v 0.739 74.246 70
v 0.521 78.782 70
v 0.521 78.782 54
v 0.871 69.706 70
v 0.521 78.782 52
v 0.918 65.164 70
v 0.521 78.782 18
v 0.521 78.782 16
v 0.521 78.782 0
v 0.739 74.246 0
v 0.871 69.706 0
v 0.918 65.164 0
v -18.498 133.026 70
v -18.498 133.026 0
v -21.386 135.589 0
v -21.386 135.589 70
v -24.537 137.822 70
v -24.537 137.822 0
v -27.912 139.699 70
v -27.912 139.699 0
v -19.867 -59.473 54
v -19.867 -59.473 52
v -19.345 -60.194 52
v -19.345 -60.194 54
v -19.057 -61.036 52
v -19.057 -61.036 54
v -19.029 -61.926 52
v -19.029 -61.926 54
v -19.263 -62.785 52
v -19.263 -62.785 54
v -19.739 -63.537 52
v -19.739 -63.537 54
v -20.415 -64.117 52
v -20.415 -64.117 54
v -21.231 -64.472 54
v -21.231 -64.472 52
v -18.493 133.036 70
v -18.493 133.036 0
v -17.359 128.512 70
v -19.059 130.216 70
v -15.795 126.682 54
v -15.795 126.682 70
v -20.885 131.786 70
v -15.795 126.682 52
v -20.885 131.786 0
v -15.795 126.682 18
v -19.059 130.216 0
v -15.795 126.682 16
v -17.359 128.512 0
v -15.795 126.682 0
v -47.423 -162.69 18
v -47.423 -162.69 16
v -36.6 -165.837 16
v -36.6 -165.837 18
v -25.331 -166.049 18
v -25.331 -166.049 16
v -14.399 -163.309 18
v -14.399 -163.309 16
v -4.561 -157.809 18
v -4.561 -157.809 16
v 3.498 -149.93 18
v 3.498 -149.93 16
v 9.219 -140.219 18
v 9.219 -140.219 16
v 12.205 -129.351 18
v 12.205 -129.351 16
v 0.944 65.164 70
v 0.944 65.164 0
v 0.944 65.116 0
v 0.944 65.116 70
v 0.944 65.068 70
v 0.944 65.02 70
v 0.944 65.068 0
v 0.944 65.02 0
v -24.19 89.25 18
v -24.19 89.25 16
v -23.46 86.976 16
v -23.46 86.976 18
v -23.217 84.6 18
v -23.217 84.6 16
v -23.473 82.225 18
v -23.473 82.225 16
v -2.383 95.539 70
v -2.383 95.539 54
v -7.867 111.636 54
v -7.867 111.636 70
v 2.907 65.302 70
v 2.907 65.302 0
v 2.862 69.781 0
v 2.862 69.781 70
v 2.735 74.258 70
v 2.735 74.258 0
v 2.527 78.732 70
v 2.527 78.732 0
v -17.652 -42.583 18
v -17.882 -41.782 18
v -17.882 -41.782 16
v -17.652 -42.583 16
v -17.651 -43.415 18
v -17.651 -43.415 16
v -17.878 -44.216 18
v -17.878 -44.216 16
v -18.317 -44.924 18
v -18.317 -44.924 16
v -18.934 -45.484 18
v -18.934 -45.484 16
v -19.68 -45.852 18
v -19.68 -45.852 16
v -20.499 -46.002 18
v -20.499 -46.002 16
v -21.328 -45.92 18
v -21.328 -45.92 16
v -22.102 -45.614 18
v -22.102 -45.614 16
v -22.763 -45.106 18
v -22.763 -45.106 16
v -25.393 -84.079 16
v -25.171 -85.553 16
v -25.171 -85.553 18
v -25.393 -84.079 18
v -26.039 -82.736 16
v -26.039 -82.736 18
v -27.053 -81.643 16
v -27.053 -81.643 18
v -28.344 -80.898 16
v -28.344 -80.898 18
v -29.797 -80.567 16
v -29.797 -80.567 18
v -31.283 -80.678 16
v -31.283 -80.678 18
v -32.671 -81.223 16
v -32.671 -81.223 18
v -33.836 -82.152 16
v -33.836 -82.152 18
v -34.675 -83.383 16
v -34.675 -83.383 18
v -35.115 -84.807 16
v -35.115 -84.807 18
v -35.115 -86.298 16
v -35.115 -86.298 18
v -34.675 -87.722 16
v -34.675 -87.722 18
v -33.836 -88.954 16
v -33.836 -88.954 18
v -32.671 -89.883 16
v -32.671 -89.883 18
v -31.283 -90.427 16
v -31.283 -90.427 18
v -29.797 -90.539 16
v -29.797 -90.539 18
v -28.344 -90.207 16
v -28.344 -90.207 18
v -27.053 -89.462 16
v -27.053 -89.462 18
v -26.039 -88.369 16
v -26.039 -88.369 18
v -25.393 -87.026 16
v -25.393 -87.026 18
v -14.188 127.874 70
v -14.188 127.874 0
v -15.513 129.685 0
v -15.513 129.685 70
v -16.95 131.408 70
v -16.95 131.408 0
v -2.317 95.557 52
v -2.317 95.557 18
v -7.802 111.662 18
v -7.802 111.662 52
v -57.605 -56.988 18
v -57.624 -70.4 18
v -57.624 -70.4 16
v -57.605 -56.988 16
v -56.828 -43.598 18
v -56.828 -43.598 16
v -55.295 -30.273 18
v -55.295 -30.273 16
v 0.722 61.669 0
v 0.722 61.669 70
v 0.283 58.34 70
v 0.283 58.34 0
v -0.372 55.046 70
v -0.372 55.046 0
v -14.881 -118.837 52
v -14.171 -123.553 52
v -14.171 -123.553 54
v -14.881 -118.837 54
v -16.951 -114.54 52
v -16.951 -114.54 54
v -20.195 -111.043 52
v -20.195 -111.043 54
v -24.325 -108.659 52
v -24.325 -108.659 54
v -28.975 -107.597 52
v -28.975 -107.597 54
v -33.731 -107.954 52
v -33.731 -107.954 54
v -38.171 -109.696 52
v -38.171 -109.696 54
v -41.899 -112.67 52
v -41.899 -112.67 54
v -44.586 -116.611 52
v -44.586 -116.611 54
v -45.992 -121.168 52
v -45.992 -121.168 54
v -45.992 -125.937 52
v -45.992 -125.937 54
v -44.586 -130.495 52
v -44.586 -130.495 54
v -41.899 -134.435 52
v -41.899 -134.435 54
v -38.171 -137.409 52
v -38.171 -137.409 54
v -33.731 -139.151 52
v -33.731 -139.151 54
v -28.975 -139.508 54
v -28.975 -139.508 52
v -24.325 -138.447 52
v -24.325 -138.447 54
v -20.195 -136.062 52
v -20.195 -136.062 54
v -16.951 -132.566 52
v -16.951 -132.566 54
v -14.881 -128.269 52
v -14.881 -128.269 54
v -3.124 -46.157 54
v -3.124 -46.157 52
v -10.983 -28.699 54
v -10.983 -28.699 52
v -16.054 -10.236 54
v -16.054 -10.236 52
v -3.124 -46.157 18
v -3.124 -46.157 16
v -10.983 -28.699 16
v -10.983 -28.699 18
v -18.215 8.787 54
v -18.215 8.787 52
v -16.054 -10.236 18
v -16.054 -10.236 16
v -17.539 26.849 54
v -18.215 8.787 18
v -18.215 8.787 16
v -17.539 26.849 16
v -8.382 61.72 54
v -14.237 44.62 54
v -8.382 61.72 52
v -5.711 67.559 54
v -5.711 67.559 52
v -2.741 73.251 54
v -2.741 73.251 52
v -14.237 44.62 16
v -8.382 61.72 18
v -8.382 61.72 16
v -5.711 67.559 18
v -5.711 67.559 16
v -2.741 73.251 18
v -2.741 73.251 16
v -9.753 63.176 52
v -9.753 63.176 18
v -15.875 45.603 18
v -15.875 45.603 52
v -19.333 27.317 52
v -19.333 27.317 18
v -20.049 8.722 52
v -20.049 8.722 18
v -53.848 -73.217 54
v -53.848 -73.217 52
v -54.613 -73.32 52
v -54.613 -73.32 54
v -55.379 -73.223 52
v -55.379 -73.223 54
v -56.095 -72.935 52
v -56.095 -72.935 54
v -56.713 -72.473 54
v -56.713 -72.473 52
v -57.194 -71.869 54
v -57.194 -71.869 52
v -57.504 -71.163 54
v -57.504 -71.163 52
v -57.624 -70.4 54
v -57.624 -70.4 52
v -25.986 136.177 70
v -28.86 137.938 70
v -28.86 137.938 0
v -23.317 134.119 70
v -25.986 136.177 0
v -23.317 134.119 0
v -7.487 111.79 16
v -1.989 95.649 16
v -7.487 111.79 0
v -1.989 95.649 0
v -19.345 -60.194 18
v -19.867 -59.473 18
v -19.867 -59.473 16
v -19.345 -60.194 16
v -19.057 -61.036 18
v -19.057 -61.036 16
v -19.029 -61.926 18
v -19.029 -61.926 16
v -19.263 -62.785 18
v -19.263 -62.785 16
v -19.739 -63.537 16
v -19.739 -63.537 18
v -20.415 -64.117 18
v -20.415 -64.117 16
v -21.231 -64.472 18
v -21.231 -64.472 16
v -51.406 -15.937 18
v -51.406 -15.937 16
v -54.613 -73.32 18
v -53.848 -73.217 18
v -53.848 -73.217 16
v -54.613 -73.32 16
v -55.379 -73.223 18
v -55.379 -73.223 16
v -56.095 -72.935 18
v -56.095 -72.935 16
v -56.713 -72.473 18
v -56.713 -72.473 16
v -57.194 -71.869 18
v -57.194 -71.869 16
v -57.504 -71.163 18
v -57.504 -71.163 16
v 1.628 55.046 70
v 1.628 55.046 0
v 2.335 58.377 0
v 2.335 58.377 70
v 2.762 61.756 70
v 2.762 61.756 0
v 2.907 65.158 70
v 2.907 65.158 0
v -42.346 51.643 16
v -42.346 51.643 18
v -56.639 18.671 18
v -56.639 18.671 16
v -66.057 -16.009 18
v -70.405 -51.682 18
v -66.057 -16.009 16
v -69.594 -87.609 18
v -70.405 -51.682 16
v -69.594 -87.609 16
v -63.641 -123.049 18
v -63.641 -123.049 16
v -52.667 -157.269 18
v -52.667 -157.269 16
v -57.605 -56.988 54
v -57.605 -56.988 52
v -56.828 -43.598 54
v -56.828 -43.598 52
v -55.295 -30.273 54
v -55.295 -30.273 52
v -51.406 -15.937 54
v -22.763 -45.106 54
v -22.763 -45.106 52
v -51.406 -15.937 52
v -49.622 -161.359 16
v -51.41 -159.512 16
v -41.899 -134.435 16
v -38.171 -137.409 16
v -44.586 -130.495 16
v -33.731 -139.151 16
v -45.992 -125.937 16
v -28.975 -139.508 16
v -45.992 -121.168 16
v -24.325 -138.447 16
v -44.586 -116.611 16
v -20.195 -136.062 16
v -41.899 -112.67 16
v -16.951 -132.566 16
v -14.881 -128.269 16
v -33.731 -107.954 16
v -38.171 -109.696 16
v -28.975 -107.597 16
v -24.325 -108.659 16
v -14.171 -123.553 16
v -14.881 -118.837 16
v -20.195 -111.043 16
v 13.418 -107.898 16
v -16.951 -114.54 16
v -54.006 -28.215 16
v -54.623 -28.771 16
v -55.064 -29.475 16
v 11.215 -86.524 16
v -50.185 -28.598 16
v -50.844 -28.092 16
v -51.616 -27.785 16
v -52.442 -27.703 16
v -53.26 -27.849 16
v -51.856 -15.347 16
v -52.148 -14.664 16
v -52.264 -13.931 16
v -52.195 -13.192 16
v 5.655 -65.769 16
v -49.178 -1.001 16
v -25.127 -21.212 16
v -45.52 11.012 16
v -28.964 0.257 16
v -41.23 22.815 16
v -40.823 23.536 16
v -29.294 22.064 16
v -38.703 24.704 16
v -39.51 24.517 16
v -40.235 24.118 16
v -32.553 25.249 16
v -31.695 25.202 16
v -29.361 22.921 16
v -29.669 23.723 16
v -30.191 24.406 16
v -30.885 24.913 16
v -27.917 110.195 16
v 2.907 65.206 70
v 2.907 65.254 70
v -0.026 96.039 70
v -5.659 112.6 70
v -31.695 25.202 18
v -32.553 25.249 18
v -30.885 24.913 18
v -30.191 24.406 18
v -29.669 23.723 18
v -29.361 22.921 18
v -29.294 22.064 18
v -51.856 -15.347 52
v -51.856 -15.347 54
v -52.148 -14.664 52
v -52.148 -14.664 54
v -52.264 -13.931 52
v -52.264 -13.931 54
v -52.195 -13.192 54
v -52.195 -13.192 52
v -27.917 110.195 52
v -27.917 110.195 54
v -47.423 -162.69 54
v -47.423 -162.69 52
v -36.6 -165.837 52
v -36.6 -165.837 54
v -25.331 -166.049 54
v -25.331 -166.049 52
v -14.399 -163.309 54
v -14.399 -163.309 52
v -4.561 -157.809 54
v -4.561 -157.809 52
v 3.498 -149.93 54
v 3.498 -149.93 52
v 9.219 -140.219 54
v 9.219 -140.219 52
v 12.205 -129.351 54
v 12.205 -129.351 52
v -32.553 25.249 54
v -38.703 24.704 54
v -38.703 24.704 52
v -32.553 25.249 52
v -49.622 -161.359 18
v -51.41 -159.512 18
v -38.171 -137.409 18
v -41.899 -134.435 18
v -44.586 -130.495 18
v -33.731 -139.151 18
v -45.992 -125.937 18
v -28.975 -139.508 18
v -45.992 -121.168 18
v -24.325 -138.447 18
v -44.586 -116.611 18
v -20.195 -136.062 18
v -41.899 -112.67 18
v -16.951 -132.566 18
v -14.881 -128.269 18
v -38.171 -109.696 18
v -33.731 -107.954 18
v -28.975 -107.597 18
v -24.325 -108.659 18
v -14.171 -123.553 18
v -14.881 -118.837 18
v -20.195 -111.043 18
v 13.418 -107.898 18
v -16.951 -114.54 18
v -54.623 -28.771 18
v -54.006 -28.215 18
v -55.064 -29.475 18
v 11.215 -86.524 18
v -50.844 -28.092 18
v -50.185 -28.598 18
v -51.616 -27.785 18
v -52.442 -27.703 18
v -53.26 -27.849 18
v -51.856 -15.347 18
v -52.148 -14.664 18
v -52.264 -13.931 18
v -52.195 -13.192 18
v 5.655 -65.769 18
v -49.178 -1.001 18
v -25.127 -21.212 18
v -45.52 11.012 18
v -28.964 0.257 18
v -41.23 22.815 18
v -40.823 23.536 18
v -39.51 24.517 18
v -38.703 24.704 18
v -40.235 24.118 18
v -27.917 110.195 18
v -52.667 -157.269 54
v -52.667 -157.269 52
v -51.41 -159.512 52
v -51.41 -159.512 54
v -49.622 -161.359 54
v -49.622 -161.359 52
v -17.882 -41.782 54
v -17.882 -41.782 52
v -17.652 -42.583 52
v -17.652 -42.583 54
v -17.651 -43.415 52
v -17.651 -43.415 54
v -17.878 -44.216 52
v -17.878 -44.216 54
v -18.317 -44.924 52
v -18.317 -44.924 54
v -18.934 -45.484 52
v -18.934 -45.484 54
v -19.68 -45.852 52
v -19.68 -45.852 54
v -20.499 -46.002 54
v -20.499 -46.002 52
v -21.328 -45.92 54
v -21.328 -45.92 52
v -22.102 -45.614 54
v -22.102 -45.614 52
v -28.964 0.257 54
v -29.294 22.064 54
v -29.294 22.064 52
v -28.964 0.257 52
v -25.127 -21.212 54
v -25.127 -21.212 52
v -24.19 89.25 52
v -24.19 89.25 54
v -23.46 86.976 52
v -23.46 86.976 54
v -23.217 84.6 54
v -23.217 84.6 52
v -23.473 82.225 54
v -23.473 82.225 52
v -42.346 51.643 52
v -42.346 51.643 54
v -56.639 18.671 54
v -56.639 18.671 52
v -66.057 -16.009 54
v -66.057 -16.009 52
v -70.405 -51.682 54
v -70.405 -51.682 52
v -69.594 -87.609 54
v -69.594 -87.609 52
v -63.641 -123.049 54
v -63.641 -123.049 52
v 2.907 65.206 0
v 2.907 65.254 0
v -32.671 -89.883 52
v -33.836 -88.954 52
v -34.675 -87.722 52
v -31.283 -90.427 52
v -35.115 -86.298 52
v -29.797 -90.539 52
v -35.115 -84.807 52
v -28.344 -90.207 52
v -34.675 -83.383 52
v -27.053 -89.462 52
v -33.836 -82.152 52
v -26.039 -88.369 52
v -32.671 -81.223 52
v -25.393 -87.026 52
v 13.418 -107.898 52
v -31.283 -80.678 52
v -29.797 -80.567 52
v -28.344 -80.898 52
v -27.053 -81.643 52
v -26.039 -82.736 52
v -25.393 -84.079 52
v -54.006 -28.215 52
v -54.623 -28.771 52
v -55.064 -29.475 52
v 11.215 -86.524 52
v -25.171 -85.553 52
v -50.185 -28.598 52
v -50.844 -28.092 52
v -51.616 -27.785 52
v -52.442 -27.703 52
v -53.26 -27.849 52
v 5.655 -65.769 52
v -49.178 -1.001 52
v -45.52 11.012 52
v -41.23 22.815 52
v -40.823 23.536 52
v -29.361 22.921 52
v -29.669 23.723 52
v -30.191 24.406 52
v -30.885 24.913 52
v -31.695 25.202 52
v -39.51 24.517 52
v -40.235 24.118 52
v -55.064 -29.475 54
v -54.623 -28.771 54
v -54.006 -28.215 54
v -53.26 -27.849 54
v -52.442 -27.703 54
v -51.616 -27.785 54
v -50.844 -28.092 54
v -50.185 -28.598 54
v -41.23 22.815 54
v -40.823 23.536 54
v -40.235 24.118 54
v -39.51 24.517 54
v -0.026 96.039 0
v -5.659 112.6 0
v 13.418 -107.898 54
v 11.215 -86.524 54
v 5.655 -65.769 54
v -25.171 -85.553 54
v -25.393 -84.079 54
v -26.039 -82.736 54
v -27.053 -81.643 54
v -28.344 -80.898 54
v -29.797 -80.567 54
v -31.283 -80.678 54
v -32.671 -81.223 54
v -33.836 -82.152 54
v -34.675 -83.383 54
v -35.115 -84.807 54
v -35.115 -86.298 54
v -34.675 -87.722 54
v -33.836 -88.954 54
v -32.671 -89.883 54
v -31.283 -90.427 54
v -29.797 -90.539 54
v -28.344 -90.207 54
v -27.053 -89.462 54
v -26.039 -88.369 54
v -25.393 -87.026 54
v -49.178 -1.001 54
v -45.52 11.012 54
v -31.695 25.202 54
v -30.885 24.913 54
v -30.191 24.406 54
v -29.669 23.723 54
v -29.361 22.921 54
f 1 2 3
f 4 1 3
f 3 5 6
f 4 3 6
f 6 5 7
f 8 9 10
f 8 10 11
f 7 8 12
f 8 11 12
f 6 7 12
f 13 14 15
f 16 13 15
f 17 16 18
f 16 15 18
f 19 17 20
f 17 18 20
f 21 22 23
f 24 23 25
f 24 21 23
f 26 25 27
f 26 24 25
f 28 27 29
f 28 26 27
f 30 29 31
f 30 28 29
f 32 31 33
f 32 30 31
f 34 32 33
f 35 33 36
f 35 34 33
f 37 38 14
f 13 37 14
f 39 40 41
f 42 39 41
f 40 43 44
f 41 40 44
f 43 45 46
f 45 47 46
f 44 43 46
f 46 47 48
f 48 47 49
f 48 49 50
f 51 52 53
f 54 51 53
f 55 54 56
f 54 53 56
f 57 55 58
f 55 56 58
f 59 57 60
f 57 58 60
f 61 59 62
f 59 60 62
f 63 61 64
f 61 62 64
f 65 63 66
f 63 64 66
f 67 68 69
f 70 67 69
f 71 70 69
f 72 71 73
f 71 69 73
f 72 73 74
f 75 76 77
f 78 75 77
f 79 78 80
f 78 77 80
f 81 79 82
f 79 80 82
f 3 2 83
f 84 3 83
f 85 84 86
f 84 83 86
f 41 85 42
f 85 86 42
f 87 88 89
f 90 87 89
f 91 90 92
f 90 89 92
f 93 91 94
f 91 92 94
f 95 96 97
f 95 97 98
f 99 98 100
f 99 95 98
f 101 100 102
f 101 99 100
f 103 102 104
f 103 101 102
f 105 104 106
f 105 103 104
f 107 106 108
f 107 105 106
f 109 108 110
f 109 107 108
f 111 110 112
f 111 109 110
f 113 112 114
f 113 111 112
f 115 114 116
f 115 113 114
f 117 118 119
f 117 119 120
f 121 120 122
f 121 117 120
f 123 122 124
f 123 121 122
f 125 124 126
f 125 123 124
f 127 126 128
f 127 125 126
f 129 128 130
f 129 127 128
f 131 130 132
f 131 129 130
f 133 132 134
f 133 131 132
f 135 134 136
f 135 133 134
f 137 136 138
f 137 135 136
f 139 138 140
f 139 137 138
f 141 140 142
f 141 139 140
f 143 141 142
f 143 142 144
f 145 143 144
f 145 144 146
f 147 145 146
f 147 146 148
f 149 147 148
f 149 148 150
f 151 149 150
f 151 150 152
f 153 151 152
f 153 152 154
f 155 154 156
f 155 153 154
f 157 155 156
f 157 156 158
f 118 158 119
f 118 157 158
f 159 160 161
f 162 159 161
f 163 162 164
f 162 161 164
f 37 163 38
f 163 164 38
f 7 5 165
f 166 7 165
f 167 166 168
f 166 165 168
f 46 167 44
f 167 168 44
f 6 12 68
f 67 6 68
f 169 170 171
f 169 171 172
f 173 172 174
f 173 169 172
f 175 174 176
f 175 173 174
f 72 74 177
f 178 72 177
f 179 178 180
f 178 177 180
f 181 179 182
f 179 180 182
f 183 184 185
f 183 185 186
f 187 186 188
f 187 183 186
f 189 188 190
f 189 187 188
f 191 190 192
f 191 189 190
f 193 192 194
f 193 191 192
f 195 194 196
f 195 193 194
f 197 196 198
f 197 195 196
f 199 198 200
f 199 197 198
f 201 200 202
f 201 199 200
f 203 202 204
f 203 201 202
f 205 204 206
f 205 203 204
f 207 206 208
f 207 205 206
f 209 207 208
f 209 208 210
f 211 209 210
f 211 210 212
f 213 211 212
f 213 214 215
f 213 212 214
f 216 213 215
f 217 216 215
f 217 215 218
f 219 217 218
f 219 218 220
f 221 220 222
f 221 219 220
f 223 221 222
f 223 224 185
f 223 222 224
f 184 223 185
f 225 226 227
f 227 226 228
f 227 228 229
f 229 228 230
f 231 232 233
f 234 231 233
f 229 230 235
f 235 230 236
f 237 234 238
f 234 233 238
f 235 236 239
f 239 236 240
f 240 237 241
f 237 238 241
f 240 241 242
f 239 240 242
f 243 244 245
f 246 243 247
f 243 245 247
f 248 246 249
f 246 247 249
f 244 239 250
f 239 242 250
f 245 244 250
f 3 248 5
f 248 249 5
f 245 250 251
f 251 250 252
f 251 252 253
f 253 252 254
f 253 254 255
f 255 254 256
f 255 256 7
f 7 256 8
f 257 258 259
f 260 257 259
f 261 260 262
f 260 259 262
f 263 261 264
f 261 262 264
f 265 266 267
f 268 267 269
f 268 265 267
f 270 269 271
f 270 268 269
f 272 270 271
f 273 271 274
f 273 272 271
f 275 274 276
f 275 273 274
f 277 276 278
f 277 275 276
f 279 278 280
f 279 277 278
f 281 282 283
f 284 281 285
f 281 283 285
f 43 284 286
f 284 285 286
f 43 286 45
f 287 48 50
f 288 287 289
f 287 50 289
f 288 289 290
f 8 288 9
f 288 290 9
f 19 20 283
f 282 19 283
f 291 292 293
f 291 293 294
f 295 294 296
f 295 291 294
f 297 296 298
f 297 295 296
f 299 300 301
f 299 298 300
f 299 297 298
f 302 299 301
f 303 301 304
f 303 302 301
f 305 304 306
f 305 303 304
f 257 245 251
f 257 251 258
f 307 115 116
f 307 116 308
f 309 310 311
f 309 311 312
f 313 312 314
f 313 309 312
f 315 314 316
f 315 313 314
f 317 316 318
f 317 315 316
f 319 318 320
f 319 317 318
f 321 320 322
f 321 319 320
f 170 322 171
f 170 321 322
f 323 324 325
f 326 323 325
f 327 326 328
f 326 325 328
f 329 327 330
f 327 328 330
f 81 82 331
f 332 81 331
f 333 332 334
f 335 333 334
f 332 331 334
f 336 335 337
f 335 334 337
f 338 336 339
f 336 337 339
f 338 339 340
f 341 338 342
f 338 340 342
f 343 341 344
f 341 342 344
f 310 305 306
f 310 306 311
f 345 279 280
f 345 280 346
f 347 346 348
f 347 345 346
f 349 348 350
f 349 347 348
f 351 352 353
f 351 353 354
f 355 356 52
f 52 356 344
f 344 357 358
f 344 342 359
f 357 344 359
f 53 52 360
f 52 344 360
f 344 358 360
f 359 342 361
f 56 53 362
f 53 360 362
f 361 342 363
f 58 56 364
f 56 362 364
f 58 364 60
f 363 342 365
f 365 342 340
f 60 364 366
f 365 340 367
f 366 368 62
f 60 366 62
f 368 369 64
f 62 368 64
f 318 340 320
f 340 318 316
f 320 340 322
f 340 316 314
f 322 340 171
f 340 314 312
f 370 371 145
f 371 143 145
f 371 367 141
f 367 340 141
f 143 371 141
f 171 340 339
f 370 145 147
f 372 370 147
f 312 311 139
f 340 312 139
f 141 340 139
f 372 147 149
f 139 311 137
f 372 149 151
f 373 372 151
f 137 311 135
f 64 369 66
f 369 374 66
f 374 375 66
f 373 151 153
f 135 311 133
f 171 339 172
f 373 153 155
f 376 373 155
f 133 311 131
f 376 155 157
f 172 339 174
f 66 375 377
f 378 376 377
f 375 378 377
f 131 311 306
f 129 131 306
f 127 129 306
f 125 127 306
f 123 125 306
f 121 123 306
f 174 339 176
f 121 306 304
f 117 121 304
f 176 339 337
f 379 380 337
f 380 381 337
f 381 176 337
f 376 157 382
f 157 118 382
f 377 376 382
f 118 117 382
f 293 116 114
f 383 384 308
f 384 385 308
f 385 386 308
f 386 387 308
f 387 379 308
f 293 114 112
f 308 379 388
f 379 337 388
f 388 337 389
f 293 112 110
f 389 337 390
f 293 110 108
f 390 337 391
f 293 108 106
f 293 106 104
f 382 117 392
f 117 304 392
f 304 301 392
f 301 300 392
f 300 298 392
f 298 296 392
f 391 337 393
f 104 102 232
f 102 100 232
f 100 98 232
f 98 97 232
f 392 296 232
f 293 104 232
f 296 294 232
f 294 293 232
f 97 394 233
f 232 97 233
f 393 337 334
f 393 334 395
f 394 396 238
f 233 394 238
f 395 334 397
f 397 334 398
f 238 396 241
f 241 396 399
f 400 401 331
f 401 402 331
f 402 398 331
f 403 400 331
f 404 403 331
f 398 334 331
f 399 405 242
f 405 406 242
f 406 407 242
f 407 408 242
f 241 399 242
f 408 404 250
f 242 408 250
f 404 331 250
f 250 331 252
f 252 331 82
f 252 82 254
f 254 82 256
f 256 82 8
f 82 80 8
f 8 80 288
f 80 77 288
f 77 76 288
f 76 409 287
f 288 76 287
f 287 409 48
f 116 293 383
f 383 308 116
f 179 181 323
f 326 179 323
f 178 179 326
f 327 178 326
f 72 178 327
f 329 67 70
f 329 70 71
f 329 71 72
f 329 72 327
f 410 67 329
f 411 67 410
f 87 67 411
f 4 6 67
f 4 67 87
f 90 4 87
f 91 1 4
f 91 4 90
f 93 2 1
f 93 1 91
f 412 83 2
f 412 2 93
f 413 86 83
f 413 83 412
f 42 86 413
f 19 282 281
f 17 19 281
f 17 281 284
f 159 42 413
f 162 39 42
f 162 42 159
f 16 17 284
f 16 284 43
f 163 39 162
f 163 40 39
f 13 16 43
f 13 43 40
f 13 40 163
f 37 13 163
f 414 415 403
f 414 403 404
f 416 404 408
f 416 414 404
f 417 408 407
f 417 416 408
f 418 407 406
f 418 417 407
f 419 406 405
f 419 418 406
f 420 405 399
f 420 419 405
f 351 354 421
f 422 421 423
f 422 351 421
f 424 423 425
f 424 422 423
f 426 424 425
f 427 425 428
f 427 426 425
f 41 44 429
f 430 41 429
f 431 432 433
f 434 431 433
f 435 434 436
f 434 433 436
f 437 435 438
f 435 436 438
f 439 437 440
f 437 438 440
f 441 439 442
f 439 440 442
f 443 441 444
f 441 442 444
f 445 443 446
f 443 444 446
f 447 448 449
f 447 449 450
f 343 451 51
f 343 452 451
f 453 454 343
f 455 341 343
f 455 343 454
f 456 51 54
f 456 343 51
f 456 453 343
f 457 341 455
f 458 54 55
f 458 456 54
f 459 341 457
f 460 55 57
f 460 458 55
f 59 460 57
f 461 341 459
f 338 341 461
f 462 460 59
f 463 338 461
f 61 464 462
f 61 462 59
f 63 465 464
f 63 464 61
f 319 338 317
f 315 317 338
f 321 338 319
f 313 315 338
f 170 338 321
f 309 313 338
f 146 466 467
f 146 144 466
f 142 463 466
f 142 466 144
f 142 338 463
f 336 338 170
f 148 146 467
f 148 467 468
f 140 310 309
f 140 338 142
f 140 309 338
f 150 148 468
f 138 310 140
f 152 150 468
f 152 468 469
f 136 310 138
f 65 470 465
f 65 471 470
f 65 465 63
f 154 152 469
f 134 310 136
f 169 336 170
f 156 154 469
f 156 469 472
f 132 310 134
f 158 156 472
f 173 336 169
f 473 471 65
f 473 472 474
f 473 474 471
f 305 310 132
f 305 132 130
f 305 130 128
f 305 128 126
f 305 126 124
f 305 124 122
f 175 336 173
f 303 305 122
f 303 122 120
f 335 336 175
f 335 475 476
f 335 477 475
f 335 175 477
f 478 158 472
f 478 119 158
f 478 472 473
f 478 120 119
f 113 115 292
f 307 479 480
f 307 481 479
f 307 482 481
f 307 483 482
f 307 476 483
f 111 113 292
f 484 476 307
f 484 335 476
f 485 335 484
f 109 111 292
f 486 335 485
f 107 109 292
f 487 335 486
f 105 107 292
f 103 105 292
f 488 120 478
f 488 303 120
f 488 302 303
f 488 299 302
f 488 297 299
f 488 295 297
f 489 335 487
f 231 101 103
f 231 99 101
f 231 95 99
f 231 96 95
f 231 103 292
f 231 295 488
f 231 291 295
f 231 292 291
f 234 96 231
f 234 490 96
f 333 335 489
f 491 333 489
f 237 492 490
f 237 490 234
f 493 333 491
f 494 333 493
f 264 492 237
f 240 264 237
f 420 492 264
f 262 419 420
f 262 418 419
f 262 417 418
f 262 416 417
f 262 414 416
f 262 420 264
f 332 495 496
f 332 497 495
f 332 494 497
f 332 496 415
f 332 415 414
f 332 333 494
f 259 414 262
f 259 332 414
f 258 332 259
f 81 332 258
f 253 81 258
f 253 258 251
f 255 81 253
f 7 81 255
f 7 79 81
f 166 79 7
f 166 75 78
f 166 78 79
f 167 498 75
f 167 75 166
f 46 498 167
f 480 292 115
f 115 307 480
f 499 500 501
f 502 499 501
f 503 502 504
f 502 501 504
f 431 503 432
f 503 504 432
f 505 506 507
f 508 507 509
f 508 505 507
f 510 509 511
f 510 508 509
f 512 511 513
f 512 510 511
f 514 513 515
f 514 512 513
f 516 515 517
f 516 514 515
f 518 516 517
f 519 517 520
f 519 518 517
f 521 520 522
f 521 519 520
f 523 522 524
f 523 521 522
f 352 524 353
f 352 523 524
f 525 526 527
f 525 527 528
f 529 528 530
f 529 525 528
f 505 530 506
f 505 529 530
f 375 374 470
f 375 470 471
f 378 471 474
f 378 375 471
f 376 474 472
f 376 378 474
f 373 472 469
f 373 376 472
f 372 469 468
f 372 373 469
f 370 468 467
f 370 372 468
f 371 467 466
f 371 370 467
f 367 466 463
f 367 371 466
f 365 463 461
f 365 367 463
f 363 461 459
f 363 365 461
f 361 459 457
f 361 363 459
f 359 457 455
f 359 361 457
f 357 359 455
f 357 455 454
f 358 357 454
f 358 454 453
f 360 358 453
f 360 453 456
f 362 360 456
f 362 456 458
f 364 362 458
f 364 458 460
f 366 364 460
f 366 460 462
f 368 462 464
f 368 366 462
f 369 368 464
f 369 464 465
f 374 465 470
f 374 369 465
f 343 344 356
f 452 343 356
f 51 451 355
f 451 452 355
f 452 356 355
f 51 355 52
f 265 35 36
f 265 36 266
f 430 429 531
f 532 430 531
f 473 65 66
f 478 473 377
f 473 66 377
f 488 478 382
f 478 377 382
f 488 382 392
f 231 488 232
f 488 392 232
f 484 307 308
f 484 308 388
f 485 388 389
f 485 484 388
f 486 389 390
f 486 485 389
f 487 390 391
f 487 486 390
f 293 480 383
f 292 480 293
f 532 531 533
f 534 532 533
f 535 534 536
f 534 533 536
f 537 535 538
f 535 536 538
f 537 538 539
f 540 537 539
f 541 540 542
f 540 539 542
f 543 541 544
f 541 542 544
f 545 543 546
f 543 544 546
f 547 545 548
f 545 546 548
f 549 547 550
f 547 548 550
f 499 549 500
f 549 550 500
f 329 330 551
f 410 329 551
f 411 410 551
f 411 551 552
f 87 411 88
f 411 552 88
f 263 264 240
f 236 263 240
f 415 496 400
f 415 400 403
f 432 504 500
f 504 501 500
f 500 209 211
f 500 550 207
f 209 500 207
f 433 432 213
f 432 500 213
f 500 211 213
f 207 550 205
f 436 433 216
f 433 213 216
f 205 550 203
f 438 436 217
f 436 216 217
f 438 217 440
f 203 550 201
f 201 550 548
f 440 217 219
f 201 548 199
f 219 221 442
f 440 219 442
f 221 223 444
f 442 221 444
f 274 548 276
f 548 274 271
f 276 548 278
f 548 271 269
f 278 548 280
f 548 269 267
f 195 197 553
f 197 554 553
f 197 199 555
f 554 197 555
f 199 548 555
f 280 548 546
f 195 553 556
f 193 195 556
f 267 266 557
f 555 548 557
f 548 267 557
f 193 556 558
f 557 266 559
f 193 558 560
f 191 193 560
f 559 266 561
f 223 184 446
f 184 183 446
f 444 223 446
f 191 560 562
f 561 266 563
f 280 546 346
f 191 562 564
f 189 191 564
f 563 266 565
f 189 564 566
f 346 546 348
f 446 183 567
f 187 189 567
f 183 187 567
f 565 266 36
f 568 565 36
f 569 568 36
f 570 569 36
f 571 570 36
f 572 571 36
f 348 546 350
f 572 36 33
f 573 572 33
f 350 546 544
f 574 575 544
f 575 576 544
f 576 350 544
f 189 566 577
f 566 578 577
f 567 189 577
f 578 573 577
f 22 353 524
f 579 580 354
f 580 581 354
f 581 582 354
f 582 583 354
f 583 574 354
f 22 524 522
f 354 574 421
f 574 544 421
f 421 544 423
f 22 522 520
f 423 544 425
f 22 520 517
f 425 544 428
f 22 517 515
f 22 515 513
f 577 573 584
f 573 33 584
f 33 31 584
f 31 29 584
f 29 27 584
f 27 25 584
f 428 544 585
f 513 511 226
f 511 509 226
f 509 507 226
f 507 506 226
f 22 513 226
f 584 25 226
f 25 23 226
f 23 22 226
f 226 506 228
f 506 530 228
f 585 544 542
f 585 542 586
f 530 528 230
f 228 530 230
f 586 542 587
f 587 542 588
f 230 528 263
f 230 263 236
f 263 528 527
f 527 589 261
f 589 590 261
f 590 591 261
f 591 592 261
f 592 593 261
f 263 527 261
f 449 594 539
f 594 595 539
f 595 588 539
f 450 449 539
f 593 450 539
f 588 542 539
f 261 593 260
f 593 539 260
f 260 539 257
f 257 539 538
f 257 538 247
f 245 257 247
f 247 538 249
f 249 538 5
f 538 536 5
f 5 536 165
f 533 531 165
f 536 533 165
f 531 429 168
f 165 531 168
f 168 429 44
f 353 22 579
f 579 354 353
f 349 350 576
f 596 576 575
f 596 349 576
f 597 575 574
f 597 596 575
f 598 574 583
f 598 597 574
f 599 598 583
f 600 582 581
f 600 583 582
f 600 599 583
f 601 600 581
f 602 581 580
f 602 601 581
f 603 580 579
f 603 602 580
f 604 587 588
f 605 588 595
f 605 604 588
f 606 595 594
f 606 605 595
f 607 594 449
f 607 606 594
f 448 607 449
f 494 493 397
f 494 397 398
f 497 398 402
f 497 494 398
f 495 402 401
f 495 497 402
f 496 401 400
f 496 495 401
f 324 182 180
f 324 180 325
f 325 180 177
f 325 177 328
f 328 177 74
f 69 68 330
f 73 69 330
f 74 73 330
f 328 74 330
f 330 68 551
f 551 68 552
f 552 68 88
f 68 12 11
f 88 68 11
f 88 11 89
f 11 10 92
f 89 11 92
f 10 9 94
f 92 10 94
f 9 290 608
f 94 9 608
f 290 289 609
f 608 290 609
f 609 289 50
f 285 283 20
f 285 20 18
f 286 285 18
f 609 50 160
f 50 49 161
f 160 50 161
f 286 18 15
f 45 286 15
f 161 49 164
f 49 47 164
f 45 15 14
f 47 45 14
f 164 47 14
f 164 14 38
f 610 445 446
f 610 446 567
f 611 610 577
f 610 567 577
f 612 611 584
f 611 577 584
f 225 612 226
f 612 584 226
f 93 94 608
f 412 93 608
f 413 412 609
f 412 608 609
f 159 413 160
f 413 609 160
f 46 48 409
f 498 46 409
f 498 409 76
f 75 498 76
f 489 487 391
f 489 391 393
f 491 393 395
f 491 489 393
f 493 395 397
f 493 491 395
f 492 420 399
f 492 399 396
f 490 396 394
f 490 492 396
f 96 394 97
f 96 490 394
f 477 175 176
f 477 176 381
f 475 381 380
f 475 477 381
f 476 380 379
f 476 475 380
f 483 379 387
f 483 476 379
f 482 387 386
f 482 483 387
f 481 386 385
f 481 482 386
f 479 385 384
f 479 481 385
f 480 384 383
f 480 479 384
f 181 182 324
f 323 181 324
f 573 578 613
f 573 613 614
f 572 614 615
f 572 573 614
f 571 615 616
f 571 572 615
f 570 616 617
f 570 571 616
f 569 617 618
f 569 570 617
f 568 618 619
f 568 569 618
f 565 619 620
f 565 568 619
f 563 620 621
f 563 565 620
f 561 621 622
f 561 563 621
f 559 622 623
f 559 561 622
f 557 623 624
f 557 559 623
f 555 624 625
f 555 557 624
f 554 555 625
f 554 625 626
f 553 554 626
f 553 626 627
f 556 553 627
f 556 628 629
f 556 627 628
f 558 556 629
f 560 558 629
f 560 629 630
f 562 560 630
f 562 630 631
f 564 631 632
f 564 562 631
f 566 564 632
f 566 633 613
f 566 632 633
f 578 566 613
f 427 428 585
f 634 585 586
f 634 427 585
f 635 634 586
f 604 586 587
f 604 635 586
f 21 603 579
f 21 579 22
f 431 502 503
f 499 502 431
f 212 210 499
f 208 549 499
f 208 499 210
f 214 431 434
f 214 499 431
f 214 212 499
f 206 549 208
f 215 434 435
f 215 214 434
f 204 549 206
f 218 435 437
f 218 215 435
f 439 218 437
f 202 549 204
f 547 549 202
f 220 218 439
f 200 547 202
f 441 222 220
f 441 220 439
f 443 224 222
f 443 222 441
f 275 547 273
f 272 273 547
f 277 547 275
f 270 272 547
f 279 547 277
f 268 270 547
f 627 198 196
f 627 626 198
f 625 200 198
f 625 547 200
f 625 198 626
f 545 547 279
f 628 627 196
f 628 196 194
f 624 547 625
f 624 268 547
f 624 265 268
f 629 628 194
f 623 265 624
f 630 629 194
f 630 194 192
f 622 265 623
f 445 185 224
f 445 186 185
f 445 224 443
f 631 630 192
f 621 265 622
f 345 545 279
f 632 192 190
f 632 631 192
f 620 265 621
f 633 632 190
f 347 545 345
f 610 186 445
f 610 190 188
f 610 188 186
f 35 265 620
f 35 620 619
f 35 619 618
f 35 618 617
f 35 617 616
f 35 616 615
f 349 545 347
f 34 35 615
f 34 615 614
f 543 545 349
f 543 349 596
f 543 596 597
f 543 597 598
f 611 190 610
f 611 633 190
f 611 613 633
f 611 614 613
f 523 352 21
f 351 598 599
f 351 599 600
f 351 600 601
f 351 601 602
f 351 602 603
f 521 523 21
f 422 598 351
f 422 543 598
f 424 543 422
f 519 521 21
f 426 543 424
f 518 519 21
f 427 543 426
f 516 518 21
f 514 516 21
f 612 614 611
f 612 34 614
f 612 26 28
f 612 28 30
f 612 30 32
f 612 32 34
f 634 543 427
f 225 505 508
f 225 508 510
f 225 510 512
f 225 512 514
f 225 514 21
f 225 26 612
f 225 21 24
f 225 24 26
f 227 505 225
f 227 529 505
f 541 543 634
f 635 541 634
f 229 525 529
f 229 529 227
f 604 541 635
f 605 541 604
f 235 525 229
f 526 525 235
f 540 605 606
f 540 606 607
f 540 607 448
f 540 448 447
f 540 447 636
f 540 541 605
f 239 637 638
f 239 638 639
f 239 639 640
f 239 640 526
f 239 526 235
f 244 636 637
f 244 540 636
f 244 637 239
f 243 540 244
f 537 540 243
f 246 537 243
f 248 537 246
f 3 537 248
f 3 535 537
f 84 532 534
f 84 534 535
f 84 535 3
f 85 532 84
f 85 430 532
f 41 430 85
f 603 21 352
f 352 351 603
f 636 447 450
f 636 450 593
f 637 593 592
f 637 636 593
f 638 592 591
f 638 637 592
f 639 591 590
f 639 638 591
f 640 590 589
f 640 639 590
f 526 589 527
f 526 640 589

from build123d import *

# Parameters (mm, degrees)
SKETCH1_R           = 16
SKETCH1_R_2         = 5
BOSS_EXTRUDE3_DEPTH = 70
CUT_EXTRUDE2_DEPTH  = 16
CUT_EXTRUDE3_DEPTH  = 16
SKETCH7_W           = 34
SKETCH7_H           = 251.612307305
CUT_EXTRUDE4_DEPTH  = 87.5
CUT_EXTRUDE5_DEPTH  = 34
BOSS_EXTRUDE4_START = -38
BOSS_EXTRUDE4_DEPTH = 38
CUT_EXTRUDE6_DEPTH  = 135


with BuildPart() as part:
    # Sketch1 → Boss-Extrude3 (new body)
    with BuildSketch(Plane.XY):
        with BuildLine():
            Line((-18.492879119, 133.036316601), (-18.498498023, 133.025878551))
            ThreePointArc((-18.498498023, 133.025878551), (-22.931133945, 136.748933151), (-27.911859958, 139.698808598))
            Line((-27.911859958, 139.698808598), (-28.859852333, 137.937754807))
            ThreePointArc((-28.859852333, 137.937754807), (-24.623995913, 135.183968868), (-20.885371833, 131.785659496))
            ThreePointArc((-20.885371833, 131.785659496), (-18.192980361, 129.380347747), (-15.794912153, 126.681502565))
            Line((-15.794912153, 126.681502565), (-27.917185271, 110.194914382))
            Line((-27.917185271, 110.194914382), (-24.189891295, 89.250297825))
            ThreePointArc((-24.189891295, 89.250297825), (-23.276240724, 85.794240187), (-23.472804176, 82.224862851))
            ThreePointArc((-23.472804176, 82.224862851), (-68.872718383, -33.767386176), (-52.667247609, -157.269356853))
            ThreePointArc((-52.667247609, -157.269356853), (-50.575514204, -160.492975125), (-47.422535875, -162.689743445))
            ThreePointArc((-47.422535875, -162.689743445), (-9.297986917, -160.884668476), (12.205361962, -129.351423863))
            ThreePointArc((12.205361962, -129.351423863), (11.215393371, -86.524352781), (-3.124290711, -46.157144361))
            ThreePointArc((-3.124290711, -46.157144361), (-18.241573573, 16.806753647), (0.520816468, 78.782211802))
            ThreePointArc((0.520816468, 78.782211802), (0.815698001, 71.975939249), (0.917818465, 65.164047251))
            Line((0.917818465, 65.164047251), (0.943780266, 65.164047251))
            ThreePointArc((0.943780266, 65.164047251), (0.943812795, 65.09180253), (0.943823638, 65.019557802))
            ThreePointArc((0.943823638, 65.019557802), (0.529498651, 60.000787978), (-0.371750777, 55.04624812))
            Line((-0.371750777, 55.04624812), (1.628249223, 55.04624812))
            ThreePointArc((1.628249223, 55.04624812), (2.583543249, 60.061971917), (2.90683401, 65.157612698))
            ThreePointArc((2.90683401, 65.157612698), (2.906823344, 65.229857425), (2.906791346, 65.302102146))
            ThreePointArc((2.906791346, 65.302102146), (2.809025603, 72.019742255), (2.526858646, 78.732165705))
            ThreePointArc((2.526858646, 78.732165705), (-2.46660039, 104.447349639), (-14.187653785, 127.874304738))
            ThreePointArc((-14.187653785, 127.874304738), (-16.217340169, 130.557833748), (-18.492879119, 133.036316601))
        make_face()
        with Locations((-30.170544826, -123.552650361)):
            Circle(SKETCH1_R, mode=Mode.SUBTRACT)
        with Locations((-30.170544826, -85.552650361)):
            Circle(SKETCH1_R_2, mode=Mode.SUBTRACT)
    extrude(amount=BOSS_EXTRUDE3_DEPTH)

    # Sketch4 → Cut-Extrude2 (cut)
    with BuildSketch(Plane(origin=(0, 0, 0), x_dir=(-1, 0, 0), z_dir=(0, 0, -1))):
        with BuildLine():
            Line((27.917185271, 110.194914382), (15.794912153, 126.681502565))
            ThreePointArc((15.794912153, 126.681502565), (4.373722035, 103.843429765), (-0.520816468, 78.782211802))
            ThreePointArc((-0.520816468, 78.782211802), (18.241573573, 16.806753647), (3.124290711, -46.157144361))
            ThreePointArc((3.124290711, -46.157144361), (-11.215393371, -86.524352781), (-12.205361962, -129.351423863))
            ThreePointArc((-12.205361962, -129.351423863), (9.297986917, -160.884668476), (47.422535875, -162.689743445))
            ThreePointArc((47.422535875, -162.689743445), (50.575514204, -160.492975125), (52.667247609, -157.269356853))
            ThreePointArc((52.667247609, -157.269356853), (68.872718383, -33.767386176), (23.472804176, 82.224862851))
            ThreePointArc((23.472804176, 82.224862851), (23.276240724, 85.794240187), (24.189891295, 89.250297825))
            Line((24.189891295, 89.250297825), (27.917185271, 110.194914382))
        make_face()
    extrude(amount=-CUT_EXTRUDE2_DEPTH, mode=Mode.SUBTRACT)

    # Sketch5 → Cut-Extrude3 (cut)
    with BuildSketch(Plane.XY.offset(70)):
        with BuildLine():
            Line((-15.794912153, 126.681502565), (-106.344691982, 77.715450511))
            Line((-106.344691982, 77.715450511), (-99.056785555, -184.356883009))
            Line((-99.056785555, -184.356883009), (38.776437557, -199.728468659))
            Line((38.776437557, -199.728468659), (9.520070812, 37.732141377))
            Line((9.520070812, 37.732141377), (-2.731904314, 53.720528852))
            Line((-2.731904314, 53.720528852), (0.520816468, 78.782211802))
            ThreePointArc((0.520816468, 78.782211802), (-4.80960476, 103.694956914), (-15.794912153, 126.681502565))
        make_face()
    extrude(amount=-CUT_EXTRUDE3_DEPTH, mode=Mode.SUBTRACT)

    # Sketch7 → Cut-Extrude4 (cut, symmetric)
    with BuildSketch(Plane(origin=(0, 0, 0), x_dir=(0, 0, -1), z_dir=(1, 0, 0))):
        with Locations((-35, -70.759905532)):
            Rectangle(SKETCH7_W, SKETCH7_H)
    extrude(amount=CUT_EXTRUDE4_DEPTH, both=True, mode=Mode.SUBTRACT)

    # Sketch8 → Cut-Extrude5 (cut)
    with BuildSketch(Plane(origin=(0, 0, 52), x_dir=(-1, 0, 0), z_dir=(0, 0, -1))):
        with BuildLine():
            Line((15.794912153, 126.681502565), (103.727403684, 77.715450511))
            Line((103.727403684, 77.715450511), (65.201238751, -183.077529844))
            Line((65.201238751, -183.077529844), (-41.355481636, -162.759511126))
            Line((-41.355481636, -162.759511126), (-12.07256107, 35.463700067))
            Line((-12.07256107, 35.463700067), (7.253704803, 49.814895562))
            Line((7.253704803, 49.814895562), (-0.520816468, 78.782211802))
            ThreePointArc((-0.520816468, 78.782211802), (4.735822291, 103.720089118), (15.794912153, 126.681502565))
        make_face()
    extrude(amount=CUT_EXTRUDE5_DEPTH, mode=Mode.SUBTRACT)

    # Sketch9 → Boss-Extrude4 (add)
    with BuildSketch(Plane.XY.offset(54).offset(BOSS_EXTRUDE4_START)):
        with BuildLine():
            Line((-8.381762523, 61.719660218), (-9.752633242, 63.175927181))
            ThreePointArc((-9.752633242, 63.175927181), (-17.943118256, 36.524072516), (-20.049083933, 8.721728902))
            Line((-20.049083933, 8.721728902), (-18.21549071, 8.787163684))
            ThreePointArc((-18.21549071, 8.787163684), (-16.213088176, 35.794856709), (-8.381762523, 61.719660218))
        make_face()
    extrude(amount=BOSS_EXTRUDE4_DEPTH)

    # Sketch11 → Cut-Extrude6 (cut)
    with BuildSketch(Plane.XY.offset(54)):
        with BuildLine():
            Line((-50.185023147, -28.598308606), (-19.867347918, -59.472801703))
            ThreePointArc((-19.867347918, -59.472801703), (-19.113609075, -62.364150109), (-21.230995297, -64.472394267))
            Line((-21.230995297, -64.472394267), (-53.847995089, -73.217282749))
            ThreePointArc((-53.847995089, -73.217282749), (-56.418775041, -72.724188951), (-57.623794539, -70.400403449))
            ThreePointArc((-57.623794539, -70.400403449), (-57.31161949, -50.287283004), (-55.294991455, -30.273081081))
            ThreePointArc((-55.294991455, -30.273081081), (-53.259893991, -27.84944683), (-50.185023147, -28.598308606))
        make_face()
        with BuildLine():
            Line((-22.762737067, -45.106159898), (-51.405782898, -15.937052632))
            ThreePointArc((-51.405782898, -15.937052632), (-52.148347837, -14.664421133), (-52.195447125, -13.191744903))
            ThreePointArc((-52.195447125, -13.191744903), (-47.4284487, 5.029431131), (-41.229607384, 22.814534346))
            ThreePointArc((-41.229607384, 22.814534346), (-40.234764305, 24.117966642), (-38.703222855, 24.703653665))
            Line((-38.703222855, 24.703653665), (-32.552921731, 25.249075291))
            ThreePointArc((-32.552921731, 25.249075291), (-30.190849915, 24.406103869), (-29.294390199, 22.063809255))
            ThreePointArc((-29.294390199, 22.063809255), (-27.47951255, -10.554827918), (-17.882279592, -41.782418145))
            ThreePointArc((-17.882279592, -41.782418145), (-18.933525001, -45.483819939), (-22.762737067, -45.106159898))
        make_face()
    extrude(amount=-CUT_EXTRUDE6_DEPTH, mode=Mode.SUBTRACT)


solid = part.part
